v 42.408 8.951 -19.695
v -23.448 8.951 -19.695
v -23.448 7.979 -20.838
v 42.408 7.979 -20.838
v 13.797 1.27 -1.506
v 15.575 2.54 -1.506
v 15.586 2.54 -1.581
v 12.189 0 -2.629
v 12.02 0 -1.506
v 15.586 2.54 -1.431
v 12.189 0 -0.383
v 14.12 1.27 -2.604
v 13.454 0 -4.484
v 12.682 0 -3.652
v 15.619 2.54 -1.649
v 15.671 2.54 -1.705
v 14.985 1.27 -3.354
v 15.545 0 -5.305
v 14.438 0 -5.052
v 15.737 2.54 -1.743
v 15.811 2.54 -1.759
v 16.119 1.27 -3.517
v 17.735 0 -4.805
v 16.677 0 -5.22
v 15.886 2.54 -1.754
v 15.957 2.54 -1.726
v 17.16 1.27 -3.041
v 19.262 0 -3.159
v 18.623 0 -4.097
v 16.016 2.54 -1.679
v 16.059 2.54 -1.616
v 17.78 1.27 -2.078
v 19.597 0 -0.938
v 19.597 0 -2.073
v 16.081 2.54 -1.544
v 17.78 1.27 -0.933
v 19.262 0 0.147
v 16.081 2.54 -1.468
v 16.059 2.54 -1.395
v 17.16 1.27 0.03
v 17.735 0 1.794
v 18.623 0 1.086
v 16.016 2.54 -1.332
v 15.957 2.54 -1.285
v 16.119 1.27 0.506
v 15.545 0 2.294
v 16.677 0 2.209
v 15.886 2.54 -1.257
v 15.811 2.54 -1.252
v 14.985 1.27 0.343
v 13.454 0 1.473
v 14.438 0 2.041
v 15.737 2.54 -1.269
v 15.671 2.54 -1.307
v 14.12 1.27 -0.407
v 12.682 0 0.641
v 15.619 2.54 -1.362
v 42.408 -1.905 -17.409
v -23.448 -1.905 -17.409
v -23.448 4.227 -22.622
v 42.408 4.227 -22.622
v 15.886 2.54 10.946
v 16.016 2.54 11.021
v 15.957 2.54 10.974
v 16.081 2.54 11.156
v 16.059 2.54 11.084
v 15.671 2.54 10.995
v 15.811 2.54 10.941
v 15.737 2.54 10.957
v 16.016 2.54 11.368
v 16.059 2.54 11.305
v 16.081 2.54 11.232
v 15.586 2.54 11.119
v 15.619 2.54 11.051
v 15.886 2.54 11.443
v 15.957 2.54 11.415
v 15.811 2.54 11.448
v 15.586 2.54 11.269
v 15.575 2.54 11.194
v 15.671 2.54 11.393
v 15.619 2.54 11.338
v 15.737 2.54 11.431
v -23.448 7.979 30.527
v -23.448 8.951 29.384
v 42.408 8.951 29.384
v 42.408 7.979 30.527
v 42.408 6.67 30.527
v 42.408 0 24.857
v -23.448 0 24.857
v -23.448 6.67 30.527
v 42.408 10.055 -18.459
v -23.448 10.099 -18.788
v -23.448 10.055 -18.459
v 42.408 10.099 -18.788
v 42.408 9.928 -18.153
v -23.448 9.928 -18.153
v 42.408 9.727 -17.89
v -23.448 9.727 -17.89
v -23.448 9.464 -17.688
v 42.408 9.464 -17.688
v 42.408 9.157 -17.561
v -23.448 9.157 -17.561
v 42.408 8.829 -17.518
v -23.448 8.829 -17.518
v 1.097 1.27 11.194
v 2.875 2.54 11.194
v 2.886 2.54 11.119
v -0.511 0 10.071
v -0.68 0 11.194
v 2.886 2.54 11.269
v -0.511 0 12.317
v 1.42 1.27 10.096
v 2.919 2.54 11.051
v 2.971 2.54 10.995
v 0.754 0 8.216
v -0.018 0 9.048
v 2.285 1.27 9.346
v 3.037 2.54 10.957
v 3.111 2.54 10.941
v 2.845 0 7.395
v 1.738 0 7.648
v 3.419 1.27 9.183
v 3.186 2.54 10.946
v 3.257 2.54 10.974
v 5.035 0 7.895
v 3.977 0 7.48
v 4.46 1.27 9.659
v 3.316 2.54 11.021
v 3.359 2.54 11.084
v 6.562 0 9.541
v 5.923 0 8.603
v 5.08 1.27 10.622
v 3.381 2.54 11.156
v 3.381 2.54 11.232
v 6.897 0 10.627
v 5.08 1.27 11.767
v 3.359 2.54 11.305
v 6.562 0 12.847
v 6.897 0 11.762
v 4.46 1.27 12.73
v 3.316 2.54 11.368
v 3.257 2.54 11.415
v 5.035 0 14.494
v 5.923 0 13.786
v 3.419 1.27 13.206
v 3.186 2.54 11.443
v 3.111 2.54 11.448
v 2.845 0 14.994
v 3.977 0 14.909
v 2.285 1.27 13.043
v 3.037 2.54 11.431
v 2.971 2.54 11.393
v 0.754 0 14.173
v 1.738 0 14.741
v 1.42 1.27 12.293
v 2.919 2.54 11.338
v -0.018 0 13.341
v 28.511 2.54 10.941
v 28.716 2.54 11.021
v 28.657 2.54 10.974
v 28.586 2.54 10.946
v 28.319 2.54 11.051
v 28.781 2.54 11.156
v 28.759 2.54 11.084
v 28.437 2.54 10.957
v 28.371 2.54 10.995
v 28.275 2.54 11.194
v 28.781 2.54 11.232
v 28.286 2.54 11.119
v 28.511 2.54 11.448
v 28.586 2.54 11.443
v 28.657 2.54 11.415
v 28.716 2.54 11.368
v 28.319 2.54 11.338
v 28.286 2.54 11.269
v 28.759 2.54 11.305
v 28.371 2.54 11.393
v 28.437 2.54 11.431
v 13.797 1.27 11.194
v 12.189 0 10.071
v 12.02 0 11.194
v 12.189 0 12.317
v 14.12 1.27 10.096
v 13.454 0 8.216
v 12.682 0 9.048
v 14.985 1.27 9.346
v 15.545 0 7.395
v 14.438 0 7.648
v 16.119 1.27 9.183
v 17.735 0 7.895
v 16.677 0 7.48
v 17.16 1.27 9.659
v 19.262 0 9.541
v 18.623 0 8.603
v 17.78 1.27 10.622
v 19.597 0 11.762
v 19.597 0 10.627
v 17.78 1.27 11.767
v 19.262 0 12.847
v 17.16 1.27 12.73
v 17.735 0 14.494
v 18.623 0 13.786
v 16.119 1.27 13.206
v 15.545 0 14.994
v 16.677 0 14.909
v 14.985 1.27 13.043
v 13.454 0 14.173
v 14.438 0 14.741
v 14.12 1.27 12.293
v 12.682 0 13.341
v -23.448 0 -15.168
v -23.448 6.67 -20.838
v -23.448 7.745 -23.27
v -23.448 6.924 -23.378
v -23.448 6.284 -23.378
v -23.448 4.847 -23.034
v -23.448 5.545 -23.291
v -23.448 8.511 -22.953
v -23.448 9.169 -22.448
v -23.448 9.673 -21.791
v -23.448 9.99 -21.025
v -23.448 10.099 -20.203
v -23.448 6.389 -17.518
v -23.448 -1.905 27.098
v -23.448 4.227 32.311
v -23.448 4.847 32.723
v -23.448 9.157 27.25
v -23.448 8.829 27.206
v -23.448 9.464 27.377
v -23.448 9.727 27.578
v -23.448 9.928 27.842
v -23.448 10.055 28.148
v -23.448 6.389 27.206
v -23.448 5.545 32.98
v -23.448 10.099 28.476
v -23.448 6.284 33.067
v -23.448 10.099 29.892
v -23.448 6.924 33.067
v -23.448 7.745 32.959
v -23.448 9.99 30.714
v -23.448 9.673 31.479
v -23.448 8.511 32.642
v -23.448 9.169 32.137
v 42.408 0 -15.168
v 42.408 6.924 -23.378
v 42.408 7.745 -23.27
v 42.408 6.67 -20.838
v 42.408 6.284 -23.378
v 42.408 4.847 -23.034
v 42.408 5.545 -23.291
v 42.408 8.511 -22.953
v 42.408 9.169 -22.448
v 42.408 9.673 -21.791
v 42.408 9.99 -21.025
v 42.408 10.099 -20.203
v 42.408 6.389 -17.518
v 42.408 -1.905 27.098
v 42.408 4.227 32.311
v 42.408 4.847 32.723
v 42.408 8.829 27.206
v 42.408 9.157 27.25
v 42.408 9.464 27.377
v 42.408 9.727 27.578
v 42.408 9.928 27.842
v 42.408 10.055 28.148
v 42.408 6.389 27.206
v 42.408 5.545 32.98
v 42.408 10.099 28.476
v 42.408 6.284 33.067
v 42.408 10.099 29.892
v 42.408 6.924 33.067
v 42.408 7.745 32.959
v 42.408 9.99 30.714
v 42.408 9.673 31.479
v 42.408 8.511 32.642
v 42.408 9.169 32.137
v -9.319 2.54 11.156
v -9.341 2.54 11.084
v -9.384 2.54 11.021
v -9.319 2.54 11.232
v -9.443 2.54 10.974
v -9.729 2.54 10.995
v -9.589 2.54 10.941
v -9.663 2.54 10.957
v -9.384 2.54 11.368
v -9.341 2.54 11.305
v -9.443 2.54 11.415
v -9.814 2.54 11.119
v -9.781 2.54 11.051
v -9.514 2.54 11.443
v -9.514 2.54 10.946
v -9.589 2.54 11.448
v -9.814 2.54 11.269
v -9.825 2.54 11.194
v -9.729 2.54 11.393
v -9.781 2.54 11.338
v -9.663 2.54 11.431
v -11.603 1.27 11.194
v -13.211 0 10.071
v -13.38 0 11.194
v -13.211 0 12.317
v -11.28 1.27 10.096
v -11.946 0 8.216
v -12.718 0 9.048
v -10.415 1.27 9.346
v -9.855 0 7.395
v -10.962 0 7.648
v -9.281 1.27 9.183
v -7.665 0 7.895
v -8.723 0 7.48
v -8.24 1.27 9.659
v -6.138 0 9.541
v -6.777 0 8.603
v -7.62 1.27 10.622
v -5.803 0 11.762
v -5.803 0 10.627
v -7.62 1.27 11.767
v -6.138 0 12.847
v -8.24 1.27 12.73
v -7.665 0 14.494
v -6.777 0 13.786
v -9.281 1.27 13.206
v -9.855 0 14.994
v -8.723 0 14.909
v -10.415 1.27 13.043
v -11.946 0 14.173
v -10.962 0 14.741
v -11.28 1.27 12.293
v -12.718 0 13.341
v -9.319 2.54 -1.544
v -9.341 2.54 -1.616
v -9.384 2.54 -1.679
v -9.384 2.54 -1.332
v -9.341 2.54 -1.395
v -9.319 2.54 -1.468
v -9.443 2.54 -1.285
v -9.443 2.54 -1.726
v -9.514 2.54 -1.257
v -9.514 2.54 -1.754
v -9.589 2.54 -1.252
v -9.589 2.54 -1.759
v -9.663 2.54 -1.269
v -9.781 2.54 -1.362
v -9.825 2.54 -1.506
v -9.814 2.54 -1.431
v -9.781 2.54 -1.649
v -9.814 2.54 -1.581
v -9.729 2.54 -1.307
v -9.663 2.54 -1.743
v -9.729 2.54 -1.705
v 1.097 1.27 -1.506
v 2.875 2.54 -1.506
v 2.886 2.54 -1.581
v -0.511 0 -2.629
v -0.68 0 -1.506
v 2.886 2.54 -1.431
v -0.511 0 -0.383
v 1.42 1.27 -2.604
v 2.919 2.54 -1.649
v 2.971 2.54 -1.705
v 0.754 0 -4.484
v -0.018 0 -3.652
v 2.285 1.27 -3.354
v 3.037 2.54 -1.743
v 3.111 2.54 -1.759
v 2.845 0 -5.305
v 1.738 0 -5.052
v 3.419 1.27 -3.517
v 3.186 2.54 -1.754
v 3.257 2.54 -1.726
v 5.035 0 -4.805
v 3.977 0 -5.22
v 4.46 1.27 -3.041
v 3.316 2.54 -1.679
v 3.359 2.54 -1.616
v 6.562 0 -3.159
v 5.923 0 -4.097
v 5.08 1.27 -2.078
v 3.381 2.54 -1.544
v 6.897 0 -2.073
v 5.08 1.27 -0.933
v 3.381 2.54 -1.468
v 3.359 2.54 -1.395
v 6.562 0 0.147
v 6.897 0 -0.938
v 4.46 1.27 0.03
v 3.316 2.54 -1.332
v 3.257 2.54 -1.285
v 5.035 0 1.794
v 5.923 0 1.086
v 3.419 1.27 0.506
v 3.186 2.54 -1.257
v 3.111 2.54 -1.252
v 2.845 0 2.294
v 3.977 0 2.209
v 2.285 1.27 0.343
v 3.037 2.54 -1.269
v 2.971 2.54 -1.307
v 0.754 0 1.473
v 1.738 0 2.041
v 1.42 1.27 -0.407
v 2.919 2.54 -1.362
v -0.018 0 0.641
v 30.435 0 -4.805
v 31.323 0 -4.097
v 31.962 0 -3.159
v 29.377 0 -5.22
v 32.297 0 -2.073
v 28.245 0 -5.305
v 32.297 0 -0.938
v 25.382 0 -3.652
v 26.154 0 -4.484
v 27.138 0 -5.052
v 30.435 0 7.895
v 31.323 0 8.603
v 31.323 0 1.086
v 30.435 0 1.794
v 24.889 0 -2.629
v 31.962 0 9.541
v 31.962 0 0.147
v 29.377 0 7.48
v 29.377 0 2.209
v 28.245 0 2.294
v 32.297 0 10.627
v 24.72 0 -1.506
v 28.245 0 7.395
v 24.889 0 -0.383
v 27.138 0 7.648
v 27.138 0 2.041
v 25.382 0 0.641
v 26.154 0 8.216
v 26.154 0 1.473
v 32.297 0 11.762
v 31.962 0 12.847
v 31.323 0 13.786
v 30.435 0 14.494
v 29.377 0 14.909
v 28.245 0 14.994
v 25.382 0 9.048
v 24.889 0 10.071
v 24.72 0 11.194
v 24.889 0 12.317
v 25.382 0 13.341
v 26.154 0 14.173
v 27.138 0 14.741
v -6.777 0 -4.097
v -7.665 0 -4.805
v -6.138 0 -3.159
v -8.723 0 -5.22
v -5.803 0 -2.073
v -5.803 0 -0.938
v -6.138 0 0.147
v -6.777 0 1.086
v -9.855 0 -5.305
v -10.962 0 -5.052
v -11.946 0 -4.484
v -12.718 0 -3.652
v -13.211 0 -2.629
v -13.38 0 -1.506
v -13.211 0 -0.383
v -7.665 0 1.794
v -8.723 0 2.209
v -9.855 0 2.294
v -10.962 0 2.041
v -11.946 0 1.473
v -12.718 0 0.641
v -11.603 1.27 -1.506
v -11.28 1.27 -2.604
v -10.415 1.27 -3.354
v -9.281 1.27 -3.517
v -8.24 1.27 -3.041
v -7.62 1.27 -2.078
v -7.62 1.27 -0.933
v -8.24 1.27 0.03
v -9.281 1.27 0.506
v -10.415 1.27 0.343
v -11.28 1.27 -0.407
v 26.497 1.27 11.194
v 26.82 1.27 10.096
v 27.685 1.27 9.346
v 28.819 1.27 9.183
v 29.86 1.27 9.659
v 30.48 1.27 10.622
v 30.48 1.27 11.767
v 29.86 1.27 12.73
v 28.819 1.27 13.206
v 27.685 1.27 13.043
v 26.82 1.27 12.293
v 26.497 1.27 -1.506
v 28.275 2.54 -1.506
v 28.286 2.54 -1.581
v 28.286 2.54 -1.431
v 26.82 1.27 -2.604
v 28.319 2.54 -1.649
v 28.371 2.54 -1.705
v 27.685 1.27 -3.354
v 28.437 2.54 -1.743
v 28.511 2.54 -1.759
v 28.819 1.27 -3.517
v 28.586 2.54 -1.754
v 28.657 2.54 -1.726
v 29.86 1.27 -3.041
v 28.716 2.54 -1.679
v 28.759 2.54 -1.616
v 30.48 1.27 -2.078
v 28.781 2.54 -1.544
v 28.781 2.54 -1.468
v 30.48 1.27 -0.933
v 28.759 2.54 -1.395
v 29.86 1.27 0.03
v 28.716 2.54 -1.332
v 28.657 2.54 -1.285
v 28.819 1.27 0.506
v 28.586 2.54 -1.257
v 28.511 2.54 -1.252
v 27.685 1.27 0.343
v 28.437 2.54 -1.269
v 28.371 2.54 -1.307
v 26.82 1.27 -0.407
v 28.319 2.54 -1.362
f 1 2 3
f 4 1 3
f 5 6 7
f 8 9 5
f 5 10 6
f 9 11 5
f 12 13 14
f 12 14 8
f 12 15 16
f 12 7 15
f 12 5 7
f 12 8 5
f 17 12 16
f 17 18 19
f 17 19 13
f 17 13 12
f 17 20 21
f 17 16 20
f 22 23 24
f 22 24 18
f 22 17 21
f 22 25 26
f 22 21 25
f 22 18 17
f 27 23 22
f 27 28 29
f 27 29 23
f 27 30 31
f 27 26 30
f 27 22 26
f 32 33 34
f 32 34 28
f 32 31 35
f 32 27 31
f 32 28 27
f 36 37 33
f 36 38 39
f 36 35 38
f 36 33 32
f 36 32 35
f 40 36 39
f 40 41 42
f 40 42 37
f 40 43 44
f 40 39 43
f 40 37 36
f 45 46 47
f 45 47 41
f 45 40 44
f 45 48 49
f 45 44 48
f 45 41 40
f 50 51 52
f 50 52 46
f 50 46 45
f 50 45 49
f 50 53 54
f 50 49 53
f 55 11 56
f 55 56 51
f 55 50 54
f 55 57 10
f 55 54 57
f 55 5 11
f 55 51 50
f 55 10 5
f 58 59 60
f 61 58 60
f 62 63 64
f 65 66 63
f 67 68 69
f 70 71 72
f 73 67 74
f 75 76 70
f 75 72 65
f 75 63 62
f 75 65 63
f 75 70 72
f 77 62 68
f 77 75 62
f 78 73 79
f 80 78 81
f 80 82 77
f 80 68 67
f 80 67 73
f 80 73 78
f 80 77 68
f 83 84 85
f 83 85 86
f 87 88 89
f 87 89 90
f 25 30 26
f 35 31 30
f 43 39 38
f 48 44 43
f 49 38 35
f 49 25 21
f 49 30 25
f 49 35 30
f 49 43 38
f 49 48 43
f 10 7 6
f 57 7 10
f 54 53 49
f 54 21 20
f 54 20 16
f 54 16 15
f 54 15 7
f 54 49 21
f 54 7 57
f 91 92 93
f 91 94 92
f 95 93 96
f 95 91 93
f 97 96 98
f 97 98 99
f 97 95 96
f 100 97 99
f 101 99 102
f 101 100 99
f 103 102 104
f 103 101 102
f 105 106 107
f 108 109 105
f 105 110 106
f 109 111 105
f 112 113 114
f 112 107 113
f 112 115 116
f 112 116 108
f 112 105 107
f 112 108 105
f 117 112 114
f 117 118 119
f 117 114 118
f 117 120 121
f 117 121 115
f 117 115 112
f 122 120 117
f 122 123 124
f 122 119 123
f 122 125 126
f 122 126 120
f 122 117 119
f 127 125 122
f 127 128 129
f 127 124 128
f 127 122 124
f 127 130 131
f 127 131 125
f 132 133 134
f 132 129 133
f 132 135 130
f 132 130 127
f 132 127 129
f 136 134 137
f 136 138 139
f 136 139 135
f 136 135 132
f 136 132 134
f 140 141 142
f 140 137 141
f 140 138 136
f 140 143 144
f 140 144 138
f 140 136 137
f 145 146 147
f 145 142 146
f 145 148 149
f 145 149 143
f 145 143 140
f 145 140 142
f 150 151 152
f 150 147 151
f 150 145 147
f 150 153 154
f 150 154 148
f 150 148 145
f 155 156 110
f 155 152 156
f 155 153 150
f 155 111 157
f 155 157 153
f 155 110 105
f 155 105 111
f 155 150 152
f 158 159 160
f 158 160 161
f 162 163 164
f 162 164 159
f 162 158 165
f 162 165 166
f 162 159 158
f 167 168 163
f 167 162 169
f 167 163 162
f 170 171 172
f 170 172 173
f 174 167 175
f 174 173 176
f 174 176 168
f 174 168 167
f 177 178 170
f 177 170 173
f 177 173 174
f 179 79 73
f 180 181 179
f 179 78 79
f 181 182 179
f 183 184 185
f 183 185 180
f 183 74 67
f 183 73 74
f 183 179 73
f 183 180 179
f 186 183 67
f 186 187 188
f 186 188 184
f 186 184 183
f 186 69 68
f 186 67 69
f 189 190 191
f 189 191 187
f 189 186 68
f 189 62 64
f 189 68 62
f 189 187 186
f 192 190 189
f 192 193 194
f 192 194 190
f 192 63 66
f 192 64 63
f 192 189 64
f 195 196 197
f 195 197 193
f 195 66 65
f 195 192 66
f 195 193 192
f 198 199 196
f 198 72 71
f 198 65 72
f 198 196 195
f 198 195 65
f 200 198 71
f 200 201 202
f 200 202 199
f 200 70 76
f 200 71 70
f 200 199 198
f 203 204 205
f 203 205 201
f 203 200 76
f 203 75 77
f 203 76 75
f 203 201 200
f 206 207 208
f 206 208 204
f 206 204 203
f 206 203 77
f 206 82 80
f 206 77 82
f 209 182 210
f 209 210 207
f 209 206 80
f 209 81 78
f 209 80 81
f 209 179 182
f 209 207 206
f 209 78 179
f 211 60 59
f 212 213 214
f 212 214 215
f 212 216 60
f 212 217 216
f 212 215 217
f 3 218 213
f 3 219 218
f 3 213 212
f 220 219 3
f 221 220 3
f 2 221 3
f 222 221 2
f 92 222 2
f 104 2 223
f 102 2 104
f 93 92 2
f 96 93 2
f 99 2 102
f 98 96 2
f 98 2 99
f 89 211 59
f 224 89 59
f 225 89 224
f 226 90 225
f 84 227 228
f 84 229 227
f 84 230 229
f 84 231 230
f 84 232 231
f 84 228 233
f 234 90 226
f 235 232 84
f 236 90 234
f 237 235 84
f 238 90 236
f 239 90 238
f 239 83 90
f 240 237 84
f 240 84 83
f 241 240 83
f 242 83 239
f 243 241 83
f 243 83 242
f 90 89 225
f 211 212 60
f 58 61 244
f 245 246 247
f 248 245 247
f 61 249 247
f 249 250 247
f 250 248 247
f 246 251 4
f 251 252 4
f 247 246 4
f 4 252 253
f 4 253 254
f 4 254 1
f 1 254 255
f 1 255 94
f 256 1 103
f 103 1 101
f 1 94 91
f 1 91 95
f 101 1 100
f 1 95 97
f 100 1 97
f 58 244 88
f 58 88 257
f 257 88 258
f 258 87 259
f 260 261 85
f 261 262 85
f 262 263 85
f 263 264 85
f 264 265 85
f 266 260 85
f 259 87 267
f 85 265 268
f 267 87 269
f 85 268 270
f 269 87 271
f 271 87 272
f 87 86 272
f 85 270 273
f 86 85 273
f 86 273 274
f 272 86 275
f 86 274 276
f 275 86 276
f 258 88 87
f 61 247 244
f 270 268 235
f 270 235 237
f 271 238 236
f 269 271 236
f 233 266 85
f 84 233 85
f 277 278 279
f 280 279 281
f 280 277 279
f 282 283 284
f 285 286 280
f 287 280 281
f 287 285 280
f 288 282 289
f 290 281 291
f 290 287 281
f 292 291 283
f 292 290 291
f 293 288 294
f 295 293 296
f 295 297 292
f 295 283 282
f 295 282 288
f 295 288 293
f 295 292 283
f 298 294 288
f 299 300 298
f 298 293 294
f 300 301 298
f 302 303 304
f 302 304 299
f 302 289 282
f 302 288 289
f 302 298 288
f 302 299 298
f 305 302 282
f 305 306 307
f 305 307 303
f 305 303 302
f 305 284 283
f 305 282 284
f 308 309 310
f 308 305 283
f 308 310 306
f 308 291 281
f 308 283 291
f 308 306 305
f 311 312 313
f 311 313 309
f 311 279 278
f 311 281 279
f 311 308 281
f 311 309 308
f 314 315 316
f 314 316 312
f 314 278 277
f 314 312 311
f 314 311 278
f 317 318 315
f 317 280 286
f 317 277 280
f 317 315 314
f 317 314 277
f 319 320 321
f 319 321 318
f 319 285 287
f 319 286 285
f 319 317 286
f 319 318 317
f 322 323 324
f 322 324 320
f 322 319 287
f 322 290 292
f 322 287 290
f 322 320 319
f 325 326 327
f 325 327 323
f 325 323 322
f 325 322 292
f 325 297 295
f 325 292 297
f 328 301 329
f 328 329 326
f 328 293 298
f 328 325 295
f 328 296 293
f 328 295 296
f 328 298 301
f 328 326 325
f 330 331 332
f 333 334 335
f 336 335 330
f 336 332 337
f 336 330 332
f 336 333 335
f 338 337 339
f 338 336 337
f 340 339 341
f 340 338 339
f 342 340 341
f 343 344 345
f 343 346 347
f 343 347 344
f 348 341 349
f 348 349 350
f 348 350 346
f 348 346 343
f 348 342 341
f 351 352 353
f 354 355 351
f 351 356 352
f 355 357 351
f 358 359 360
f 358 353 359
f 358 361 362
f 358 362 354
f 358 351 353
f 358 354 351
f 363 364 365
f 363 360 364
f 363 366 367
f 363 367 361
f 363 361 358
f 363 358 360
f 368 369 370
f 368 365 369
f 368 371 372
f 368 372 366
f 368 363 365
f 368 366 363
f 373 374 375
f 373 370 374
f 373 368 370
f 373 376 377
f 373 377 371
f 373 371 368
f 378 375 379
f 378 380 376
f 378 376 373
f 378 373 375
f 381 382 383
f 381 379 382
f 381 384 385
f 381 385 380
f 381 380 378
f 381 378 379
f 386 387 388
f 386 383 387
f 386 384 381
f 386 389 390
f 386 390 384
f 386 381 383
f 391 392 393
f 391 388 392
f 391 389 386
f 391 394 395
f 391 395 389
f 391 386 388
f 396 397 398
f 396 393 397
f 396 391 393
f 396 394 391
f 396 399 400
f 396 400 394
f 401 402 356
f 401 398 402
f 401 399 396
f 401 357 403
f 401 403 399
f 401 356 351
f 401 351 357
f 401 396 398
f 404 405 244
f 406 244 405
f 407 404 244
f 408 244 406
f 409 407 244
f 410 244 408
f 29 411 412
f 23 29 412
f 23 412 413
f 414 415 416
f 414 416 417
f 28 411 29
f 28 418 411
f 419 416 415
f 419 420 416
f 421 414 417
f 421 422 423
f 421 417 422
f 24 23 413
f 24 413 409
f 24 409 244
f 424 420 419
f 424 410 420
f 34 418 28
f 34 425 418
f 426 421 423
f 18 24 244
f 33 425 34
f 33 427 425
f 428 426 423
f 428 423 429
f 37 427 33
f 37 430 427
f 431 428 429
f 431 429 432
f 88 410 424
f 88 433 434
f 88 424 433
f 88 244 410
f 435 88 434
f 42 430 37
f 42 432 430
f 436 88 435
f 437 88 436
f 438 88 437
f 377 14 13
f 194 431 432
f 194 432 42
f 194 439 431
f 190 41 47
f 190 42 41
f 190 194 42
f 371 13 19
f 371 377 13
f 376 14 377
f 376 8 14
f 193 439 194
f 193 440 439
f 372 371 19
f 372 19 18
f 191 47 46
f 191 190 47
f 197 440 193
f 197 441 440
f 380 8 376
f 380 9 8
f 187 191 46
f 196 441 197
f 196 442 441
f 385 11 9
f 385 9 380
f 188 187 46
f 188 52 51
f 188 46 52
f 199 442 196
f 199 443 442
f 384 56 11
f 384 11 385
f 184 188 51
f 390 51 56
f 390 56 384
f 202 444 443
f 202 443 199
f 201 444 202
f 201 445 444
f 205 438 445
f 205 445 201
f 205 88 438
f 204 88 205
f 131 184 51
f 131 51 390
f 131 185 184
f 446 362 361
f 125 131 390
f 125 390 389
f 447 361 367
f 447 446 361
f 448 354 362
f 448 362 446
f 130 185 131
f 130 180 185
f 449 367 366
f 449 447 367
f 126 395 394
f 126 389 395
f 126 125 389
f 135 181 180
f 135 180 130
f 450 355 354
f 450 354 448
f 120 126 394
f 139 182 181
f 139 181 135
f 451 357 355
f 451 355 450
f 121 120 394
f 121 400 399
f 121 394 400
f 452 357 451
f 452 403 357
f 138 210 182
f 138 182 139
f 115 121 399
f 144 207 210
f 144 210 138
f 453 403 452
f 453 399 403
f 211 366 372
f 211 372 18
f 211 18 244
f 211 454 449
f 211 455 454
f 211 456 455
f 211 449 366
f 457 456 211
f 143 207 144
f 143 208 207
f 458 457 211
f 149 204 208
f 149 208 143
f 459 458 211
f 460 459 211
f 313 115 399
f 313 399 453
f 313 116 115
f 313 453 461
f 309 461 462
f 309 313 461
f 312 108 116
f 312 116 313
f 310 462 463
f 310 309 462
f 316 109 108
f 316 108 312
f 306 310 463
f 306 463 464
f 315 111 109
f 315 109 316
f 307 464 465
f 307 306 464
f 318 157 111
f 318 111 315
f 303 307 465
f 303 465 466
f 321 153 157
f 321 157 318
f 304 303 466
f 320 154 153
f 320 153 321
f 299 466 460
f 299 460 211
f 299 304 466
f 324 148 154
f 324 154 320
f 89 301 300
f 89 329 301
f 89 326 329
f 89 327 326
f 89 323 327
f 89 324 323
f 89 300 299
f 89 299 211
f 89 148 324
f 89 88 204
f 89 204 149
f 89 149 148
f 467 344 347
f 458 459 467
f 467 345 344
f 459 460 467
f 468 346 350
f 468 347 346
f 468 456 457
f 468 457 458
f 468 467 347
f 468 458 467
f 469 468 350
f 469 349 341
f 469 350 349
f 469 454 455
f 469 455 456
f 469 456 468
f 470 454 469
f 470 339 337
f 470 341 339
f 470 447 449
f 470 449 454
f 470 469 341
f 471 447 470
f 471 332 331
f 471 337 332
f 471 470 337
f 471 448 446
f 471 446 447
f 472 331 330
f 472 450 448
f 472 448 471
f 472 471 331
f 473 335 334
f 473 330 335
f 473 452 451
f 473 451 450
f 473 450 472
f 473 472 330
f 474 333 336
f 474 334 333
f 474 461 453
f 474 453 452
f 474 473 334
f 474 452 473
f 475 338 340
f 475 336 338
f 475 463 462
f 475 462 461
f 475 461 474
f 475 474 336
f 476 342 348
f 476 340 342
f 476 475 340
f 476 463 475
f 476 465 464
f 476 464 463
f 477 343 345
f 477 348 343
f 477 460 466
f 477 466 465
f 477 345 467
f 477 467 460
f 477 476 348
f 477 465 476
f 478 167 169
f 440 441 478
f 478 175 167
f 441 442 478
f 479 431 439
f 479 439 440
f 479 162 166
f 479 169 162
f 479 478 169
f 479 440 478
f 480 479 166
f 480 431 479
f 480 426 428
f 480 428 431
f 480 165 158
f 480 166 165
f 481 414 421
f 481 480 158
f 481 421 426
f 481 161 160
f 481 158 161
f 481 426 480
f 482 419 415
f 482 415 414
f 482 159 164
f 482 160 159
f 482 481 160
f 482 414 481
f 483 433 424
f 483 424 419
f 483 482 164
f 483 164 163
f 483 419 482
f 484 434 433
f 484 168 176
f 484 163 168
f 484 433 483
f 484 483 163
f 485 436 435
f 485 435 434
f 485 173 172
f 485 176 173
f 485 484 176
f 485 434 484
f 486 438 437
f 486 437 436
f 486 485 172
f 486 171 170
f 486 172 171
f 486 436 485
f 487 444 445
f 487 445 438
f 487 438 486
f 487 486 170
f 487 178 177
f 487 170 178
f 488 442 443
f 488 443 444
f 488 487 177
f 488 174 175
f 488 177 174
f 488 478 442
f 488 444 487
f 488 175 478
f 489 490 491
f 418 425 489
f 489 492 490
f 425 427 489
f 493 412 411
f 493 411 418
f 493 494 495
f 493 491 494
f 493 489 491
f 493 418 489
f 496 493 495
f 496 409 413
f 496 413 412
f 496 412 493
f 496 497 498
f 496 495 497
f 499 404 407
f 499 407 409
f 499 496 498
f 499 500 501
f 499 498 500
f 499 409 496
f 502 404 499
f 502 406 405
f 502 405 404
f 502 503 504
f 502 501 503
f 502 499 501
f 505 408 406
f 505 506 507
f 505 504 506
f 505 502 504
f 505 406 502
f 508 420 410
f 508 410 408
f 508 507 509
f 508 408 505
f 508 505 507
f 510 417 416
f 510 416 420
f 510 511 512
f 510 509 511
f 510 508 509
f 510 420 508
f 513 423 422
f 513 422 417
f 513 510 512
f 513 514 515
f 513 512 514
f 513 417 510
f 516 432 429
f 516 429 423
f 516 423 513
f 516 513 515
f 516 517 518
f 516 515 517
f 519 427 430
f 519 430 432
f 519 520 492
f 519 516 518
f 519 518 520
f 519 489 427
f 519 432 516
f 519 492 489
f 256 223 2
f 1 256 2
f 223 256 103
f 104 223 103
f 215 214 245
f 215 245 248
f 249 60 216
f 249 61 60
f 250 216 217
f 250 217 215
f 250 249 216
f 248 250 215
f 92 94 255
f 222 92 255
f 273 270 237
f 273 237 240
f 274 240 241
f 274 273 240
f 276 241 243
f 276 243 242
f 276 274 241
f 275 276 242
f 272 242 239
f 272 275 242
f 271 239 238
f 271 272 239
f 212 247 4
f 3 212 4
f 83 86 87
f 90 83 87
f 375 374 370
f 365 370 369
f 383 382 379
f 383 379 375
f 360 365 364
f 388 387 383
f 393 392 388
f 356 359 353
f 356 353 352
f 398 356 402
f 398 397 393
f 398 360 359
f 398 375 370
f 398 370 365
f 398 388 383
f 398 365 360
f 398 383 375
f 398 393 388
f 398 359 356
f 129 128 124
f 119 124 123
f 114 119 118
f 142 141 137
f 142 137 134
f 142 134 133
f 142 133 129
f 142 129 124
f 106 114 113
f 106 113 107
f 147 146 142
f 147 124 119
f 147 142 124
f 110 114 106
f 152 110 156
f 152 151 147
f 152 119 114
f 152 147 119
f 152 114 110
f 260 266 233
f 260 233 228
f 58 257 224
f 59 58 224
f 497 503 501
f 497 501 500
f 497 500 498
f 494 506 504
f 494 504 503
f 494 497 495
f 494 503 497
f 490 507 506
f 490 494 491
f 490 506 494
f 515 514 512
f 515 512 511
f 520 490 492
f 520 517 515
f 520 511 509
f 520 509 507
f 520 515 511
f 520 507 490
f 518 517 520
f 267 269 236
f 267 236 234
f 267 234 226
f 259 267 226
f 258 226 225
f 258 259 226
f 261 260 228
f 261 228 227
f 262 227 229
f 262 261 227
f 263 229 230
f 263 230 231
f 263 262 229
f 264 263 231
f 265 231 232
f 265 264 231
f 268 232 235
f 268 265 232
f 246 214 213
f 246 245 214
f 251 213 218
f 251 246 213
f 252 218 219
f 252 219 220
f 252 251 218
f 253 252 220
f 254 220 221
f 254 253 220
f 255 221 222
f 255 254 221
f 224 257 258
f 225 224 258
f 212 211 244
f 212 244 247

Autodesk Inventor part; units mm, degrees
ref_plane "YZ Plane" through (0, 0, 0) normal (1, 0, 0) x (0, 1, 0)
ref_plane "XZ Plane" through (0, 0, 0) normal (0, 1, 0) x (-1, 0, 0)
ref_plane "XY Plane" through (0, 0, 0) normal (0, 0, 1) x (1, 0, 0)
sketch "Sketch1" plane through (0, 0, 0) normal (0, 1, 0) x (-1, 0, 0)
  line L0 (24.9723, 27.098) -> (-43.9316, 27.098)
  line L1 (-43.9316, 27.098) -> (-43.9316, -17.4091)
  line L2 (-43.9316, -17.4091) -> (24.9723, -17.4091)
  line L3 (24.9723, -17.4091) -> (24.9723, 27.098)
  circle A0 centre (9.5704, -1.5056) radius 3.81
  circle A1 centre (-3.1296, -1.5056) radius 3.81
  circle A2 centre (-15.8296, -1.5056) radius 3.81
  circle A3 centre (-28.5296, -1.5056) radius 3.81
  circle A4 centre (9.5704, 11.1944) radius 3.81
  circle A5 centre (-3.1296, 11.1944) radius 3.81
  circle A6 centre (-15.8296, 11.1944) radius 3.81
  circle A7 centre (-28.5296, 11.1944) radius 3.81
  line L4 (24.9723, -17.4091) -> (23.4483, -17.4091)
  line L5 (23.4483, -17.4091) -> (23.4483, 27.098)
  line L6 (-43.9316, -17.4091) -> (-42.4076, -17.4091)
  line L7 (-42.4076, -17.4091) -> (-42.4076, 27.098)
  point P0 (0, 0)
  dimension "d3" = 12.7
  dimension "d6" = 12.7
  dimension "d9" = 1.524
  dimension "d10" = 1.524
extrude "Extrusion1" add sketch "Sketch1" against normal blind 1.905 contours L5 L2 L7 L0 | A0 | A1 | A2 | A3 | A4 | A5 | A6 | A7
extrude "Extrusion2" add sketch "Sketch1" along normal blind 2.54 contours A0 | A1 | A2 | A3 | A4 | A5 | A6 | A7
chamfer "Chamfer1" distance 3.556 distance2 2.54 1 edges at (-5.7604, 2.54, 11.1944) measured on face at (-7.8424, 2.54, 10.6775)
chamfer "Chamfer2" distance 3.556 distance2 2.54 1 edges at (-5.7604, 2.54, -1.5056) measured on face at (-9.9176, 2.54, -0.5901)
chamfer "Chamfer3" distance 3.556 distance2 2.54 1 edges at (6.9396, 2.54, -1.5056) measured on face at (2.4763, 2.54, -0.5901)
chamfer "Chamfer4" distance 3.556 distance2 2.54 1 edges at (19.6396, 2.54, -1.5056) measured on face at (16.7802, 2.54, -2.3477)
chamfer "Chamfer5" distance 3.556 distance2 2.54 1 edges at (32.3396, 2.54, -1.5056) measured on face at (28.1824, 2.54, -0.5901)
chamfer "Chamfer6" distance 3.556 distance2 2.54 1 edges at (6.9396, 2.54, 11.1944) measured on face at (2.382, 2.54, 9.9337)
chamfer "Chamfer7" distance 3.556 distance2 2.54 1 edges at (19.6396, 2.54, 11.1944) measured on face at (16.7802, 2.54, 10.3523)
chamfer "Chamfer8" distance 3.556 distance2 2.54 1 edges at (32.3396, 2.54, 11.1944) measured on face at (28.1824, 2.54, 12.1099)
sketch "Sketch2" plane through (42.4076, 0, 27.098) normal (1, 0, 0) x (0, 0, -1)
  line L0 (19.1798, 6.2965) -> (19.1798, 7.6808)
  arc A0 (21.1991, 9.7001) -> (19.1798, 7.6808) centre (21.1991, 7.6808) ccw
  line L1 (21.1991, 9.7001) -> (26.1711, 9.7001)
  arc A1 (27.8729, 7.9983) -> (26.1711, 9.7001) centre (26.1711, 7.9983) ccw
  line L2 (27.8729, 7.9983) -> (27.8729, 6.2965)
  arc A2 (27.2379, 5.6615) -> (27.8729, 6.2965) centre (27.2379, 6.2965) ccw
  line L3 (27.2379, 5.6615) -> (19.8148, 5.6615)
  arc A3 (19.1798, 6.2965) -> (19.8148, 5.6615) centre (19.8148, 6.2965) ccw
  line L4 (26.8541, 21.209) -> (26.8541, 19.8247)
  arc A4 (24.8348, 17.8054) -> (26.8541, 19.8247) centre (24.8348, 19.8247) ccw
  line L5 (24.8348, 17.8054) -> (19.8628, 17.8054)
  arc A5 (18.161, 19.5072) -> (19.8628, 17.8054) centre (19.8628, 19.5072) ccw
  line L6 (18.161, 19.5072) -> (18.161, 21.209)
  arc A6 (18.796, 21.844) -> (18.161, 21.209) centre (18.796, 21.209) ccw
  line L7 (18.796, 21.844) -> (26.2191, 21.844)
  arc A7 (26.8541, 21.209) -> (26.2191, 21.844) centre (26.2191, 21.209) ccw
  line L8 (44.5071, 3.302) -> (0, 3.302)
  line L9 (44.5071, 3.302) -> (47.4281, 6.7381)
  line L10 (47.4281, 6.7381) -> (47.4281, 7.7839)
  line L11 (44.5071, 7.7839) -> (44.5071, 27.94)
  line L12 (42.6021, 27.94) -> (44.5071, 27.94)
  line L13 (42.6021, 26.9875) -> (42.6021, 27.94)
  line L14 (42.6021, 26.9875) -> (43.5546, 26.9875)
  line L15 (43.5546, 26.035) -> (43.5546, 26.9875)
  line L16 (0.9525, 26.035) -> (43.5546, 26.035)
  line L17 (0.9525, 26.035) -> (0.9525, 26.9875)
  line L18 (0.9525, 26.9875) -> (1.905, 26.9875)
  line L19 (1.905, 26.9875) -> (1.905, 27.94)
  line L20 (0, 27.94) -> (1.905, 27.94)
  line L21 (0, 7.7839) -> (0, 27.94)
  line L22 (0, 7.7839) -> (-2.921, 7.7839)
  line L23 (-2.921, 7.7839) -> (-2.921, 6.7381)
  line L24 (-2.921, 6.7381) -> (0, 3.302)
  line L25 (0, 0) -> (44.5071, 0) projected
  line L26 (0, -1.905) -> (-5.2131, 4.2274)
  line L27 (0, 3.302) -> (2.807, 0)
  line L28 (2.807, 0) -> (2.241, 0)
  line L29 (2.241, 0) -> (-3.429, 6.6699)
  line L30 (-2.921, 6.7381) -> (-3.429, 6.7381)
  line L31 (-3.429, 6.7381) -> (-3.429, 6.6699)
  line L32 (-3.429, 6.7381) -> (-3.429, 7.7839)
  line L33 (-3.429, 7.7839) -> (-3.429, 8.2919)
  line L34 (-2.921, 7.7839) -> (-1.651, 7.7839)
  line L35 (-1.651, 7.7839) -> (0, 5.8417)
  line L36 (-5.969, 8.2919) -> (-5.969, 5.6615)
  line L37 (-5.8869, 5.0201) -> (-5.969, 5.1167)
  line L38 (-5.969, 5.6615) -> (-5.969, 6.2838)
  line L39 (0, 6.2616) -> (-2.286, 8.9508)
  line L40 (-2.286, 8.9508) -> (-3.429, 7.9791)
  line L41 (-0.1085, 6.3892) -> (-0.1085, 8.8286)
  line L42 (-1.3785, 10.0986) -> (-2.794, 10.0986)
  line L43 (-5.969, 6.9236) -> (-5.969, 8.2919)
  arc A8 (-2.794, 10.0986) -> (-5.969, 6.9236) centre (-2.794, 6.9236) ccw
  line L44 (47.4281, 7.7839) -> (47.4281, 6.7381)
  line L45 (47.4281, 6.7381) -> (47.9361, 6.7381)
  line L46 (47.9361, 6.7381) -> (47.9361, 6.6699)
  line L47 (47.9361, 6.7381) -> (47.9361, 7.7839)
  line L48 (47.9361, 7.7839) -> (47.9361, 8.2919)
  line L49 (46.7931, 8.9508) -> (47.9361, 7.9791)
  arc A9 (50.4761, 6.9236) -> (47.3011, 10.0986) centre (47.3011, 6.9236) ccw
  line L50 (50.4761, 6.9236) -> (50.4761, 8.2919)
  line L51 (50.4761, 8.2919) -> (50.4761, 6.2838)
  line L52 (50.4761, 5.6615) -> (50.4761, 5.1167)
  line L53 (50.394, 5.0201) -> (50.4761, 5.1167)
  line L54 (47.4281, 6.7381) -> (44.5071, 3.302)
  line L55 (41.7002, 0) -> (42.2662, 0)
  line L56 (44.6156, 6.3892) -> (44.6156, 8.8286)
  line L57 (44.5071, 3.302) -> (41.7002, 0)
  line L58 (44.5071, 6.2616) -> (46.7931, 8.9508)
  line L59 (45.8856, 10.0986) -> (47.3011, 10.0986)
  line L60 (42.2662, 0) -> (47.9361, 6.6699)
  line L61 (44.5071, -1.905) -> (49.7202, 4.2274)
  line L62 (44.5071, 0) -> (44.5071, -1.905) projected
  line L63 (0, 0) -> (0, -1.905) projected
  line L64 (0, -1.905) -> (0, 0)
  line L65 (0, 0) -> (2.241, 0)
  line L66 (44.5071, -1.905) -> (44.5071, 0)
  line L67 (44.5071, 0) -> (42.2662, 0)
  arc A10 (-5.969, 6.2838) -> (-5.2131, 4.2274) centre (-2.794, 6.2838) ccw
  arc A11 (49.7202, 4.2274) -> (50.4761, 6.2838) centre (47.3011, 6.2838) ccw
  arc A12 (-0.1085, 8.8286) -> (-1.3785, 10.0986) centre (-1.3785, 8.8286) ccw
  arc A13 (45.8856, 10.0986) -> (44.6156, 8.8286) centre (45.8856, 8.8286) ccw
  point P0 (27.098, 0)
  point P1 (2.3019, 5.207)
  point P2 (-0.1085, 10.0986)
  point P3 (58.983, -0.9263)
  point P4 (58.983, -2.8313)
  point P5 (42.2053, 5.207)
  point P6 (44.6156, 10.0986)
  point P7 (50.4761, 6.9236)
  point P8 (-1.2941, 7.7839)
  point P9 (-0.1085, 7.7839)
  dimension "d41" = 3.302
  dimension "d42" = 0.508
  dimension "d43" = 0.508
  dimension "d44" = 1.27
  dimension "d45" = 2.54
  dimension "d46" = 3.175
  dimension "d53" = 3.175
  dimension "d56" = 1.27
extrude "Extrusion3" add sketch "Sketch2" against normal up to surface (65.8559 mm away) contours L47 L48 L49 L58 L56 A13 L59 A9 L51 A11 L61 L62 L25 L60 L46 | L31 L29 L25 L63 L26 A10 L36 A8 L42 A12 L41 L22 L39 L40 L33 L32 | L22 L41 L39
properties part number "ControllerClamp"
